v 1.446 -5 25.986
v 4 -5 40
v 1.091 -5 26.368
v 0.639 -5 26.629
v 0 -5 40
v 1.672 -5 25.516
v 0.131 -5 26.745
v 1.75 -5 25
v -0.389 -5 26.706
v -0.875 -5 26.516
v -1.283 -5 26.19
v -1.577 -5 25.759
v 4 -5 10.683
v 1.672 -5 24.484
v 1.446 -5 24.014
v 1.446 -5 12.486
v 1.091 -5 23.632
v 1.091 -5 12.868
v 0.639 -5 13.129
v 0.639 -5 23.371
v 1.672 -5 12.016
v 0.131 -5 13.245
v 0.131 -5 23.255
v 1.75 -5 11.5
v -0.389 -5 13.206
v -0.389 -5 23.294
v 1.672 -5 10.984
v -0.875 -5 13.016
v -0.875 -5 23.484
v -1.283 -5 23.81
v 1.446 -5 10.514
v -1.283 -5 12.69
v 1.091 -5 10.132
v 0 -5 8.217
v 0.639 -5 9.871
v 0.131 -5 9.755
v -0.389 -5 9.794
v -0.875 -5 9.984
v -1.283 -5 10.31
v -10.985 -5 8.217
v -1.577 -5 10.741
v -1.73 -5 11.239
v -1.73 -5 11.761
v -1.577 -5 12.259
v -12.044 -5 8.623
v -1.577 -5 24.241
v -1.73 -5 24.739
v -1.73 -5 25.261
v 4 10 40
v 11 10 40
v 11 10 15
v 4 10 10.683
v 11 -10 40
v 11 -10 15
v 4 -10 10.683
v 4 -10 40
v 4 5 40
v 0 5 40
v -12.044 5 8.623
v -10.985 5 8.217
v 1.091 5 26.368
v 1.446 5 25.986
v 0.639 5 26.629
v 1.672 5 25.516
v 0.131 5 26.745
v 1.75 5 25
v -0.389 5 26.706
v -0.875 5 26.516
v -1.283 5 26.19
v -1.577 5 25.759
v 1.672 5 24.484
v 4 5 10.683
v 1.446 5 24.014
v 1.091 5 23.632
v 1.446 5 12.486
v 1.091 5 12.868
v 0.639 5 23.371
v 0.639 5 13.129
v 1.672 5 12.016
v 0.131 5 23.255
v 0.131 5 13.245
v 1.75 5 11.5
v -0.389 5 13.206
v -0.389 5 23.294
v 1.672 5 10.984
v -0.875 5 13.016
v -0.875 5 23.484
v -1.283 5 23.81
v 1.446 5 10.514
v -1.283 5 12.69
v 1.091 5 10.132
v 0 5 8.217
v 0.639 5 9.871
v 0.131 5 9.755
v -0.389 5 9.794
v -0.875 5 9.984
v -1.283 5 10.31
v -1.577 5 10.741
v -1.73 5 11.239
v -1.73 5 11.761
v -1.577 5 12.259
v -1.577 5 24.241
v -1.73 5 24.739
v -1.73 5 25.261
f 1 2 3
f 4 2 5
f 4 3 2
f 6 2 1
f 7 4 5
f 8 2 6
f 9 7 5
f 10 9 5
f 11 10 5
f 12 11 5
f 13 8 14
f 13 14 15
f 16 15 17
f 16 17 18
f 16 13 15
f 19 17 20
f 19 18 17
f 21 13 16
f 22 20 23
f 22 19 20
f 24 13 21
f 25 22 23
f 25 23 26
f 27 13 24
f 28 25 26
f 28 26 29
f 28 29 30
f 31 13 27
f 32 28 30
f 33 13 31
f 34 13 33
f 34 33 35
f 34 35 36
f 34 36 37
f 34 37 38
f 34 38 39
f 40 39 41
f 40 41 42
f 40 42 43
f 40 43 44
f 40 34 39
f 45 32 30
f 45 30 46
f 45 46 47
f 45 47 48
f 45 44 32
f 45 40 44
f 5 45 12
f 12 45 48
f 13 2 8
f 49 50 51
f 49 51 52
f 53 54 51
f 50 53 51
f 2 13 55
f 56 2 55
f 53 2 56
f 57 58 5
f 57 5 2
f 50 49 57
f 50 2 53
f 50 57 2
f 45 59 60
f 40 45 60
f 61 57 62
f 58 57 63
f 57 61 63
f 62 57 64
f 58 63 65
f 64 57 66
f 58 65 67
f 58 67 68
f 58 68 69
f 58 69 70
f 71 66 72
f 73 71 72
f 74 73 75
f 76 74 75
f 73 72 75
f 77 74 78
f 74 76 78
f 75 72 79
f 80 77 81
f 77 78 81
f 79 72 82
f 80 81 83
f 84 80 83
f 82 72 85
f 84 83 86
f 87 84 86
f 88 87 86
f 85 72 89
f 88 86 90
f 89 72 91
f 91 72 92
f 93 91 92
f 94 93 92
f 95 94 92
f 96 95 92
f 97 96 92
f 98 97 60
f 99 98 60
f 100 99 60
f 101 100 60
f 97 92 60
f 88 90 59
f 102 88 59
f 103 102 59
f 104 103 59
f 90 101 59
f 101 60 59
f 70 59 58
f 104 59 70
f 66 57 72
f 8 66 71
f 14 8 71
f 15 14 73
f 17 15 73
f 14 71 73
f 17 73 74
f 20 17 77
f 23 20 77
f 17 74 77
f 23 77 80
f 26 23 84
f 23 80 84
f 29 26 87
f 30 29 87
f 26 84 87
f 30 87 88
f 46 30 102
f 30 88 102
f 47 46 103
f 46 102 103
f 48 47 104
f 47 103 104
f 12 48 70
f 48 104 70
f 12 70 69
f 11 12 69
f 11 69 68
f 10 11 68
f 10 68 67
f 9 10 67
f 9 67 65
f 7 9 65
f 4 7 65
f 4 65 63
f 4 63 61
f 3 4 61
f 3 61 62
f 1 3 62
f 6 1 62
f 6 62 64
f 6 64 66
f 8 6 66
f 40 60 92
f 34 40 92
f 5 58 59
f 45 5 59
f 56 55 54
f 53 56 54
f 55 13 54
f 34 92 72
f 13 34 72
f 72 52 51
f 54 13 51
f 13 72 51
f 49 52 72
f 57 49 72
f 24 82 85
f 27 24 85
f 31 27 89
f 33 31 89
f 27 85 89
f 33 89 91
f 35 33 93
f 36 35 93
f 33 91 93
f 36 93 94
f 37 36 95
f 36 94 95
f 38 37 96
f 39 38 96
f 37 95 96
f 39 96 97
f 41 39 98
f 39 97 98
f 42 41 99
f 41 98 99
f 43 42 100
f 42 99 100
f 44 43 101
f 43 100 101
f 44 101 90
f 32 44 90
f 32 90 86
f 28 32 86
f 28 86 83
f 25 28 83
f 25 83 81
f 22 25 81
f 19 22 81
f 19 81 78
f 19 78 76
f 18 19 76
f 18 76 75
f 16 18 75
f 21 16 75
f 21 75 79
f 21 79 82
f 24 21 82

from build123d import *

# Parameters (mm, degrees)
AUFSATZ_LINEAR_AUSTRAGEN1_DEPTH      = 40
AUFSATZ_LINEAR_AUSTRAGEN2_DEPTH      = 10
SCHNITT_LINEAR_AUSTRAGEN1_DEPTH      = 20
SKIZZE5_R                            = 1.75
SCHNITT_LINEAR_AUSTRAGEN2_DEPTH      = 1
SCHNITT_LINEAR_AUSTRAGEN2_DEPTH_BACK = 21


with BuildPart() as part:
    # Skizze1 → Aufsatz-Linear austragen1 (new body)
    with BuildSketch(Plane.XY):
        Polygon((0, 5), (0, -5), (4, -5), (4, -10), (11, -10), (11, 10), (4, 10), (4, 5), align=None)
    extrude(amount=AUFSATZ_LINEAR_AUSTRAGEN1_DEPTH)

    # Skizze2 → Aufsatz-Linear austragen2 (add)
    with BuildSketch(Plane(origin=(0, 5, 0), x_dir=(1, 0, 0), z_dir=(0, 1, 0))):
        Polygon((0, -40), (-12.044350914, -8.623393141), (0, -4), align=None)
    extrude(amount=-AUFSATZ_LINEAR_AUSTRAGEN2_DEPTH)

    # Skizze4 → Schnitt-Linear austragen1 (cut)
    with BuildSketch(Plane(origin=(0, 10, 0), x_dir=(1, 0, 0), z_dir=(0, 1, 0))):
        Polygon((-10.985237261, -8.216837501), (0, -8.216837501), (11, -15), (11, 0), (0, 0), (0, -4), align=None)
    extrude(amount=-SCHNITT_LINEAR_AUSTRAGEN1_DEPTH, mode=Mode.SUBTRACT)

    # Skizze5 → Schnitt-Linear austragen2 (cut, two sides)
    with BuildSketch(Plane(origin=(0, 10, 0), x_dir=(1, 0, 0), z_dir=(0, 1, 0))) as schnitt_linear_austragen2_sk:
        with Locations((0, -25)):
            Circle(SKIZZE5_R)
        with Locations((0, -11.5)):
            Circle(SKIZZE5_R)
    extrude(amount=SCHNITT_LINEAR_AUSTRAGEN2_DEPTH, mode=Mode.SUBTRACT)
    extrude(schnitt_linear_austragen2_sk.sketch, amount=-SCHNITT_LINEAR_AUSTRAGEN2_DEPTH_BACK, mode=Mode.SUBTRACT)


solid = part.part
